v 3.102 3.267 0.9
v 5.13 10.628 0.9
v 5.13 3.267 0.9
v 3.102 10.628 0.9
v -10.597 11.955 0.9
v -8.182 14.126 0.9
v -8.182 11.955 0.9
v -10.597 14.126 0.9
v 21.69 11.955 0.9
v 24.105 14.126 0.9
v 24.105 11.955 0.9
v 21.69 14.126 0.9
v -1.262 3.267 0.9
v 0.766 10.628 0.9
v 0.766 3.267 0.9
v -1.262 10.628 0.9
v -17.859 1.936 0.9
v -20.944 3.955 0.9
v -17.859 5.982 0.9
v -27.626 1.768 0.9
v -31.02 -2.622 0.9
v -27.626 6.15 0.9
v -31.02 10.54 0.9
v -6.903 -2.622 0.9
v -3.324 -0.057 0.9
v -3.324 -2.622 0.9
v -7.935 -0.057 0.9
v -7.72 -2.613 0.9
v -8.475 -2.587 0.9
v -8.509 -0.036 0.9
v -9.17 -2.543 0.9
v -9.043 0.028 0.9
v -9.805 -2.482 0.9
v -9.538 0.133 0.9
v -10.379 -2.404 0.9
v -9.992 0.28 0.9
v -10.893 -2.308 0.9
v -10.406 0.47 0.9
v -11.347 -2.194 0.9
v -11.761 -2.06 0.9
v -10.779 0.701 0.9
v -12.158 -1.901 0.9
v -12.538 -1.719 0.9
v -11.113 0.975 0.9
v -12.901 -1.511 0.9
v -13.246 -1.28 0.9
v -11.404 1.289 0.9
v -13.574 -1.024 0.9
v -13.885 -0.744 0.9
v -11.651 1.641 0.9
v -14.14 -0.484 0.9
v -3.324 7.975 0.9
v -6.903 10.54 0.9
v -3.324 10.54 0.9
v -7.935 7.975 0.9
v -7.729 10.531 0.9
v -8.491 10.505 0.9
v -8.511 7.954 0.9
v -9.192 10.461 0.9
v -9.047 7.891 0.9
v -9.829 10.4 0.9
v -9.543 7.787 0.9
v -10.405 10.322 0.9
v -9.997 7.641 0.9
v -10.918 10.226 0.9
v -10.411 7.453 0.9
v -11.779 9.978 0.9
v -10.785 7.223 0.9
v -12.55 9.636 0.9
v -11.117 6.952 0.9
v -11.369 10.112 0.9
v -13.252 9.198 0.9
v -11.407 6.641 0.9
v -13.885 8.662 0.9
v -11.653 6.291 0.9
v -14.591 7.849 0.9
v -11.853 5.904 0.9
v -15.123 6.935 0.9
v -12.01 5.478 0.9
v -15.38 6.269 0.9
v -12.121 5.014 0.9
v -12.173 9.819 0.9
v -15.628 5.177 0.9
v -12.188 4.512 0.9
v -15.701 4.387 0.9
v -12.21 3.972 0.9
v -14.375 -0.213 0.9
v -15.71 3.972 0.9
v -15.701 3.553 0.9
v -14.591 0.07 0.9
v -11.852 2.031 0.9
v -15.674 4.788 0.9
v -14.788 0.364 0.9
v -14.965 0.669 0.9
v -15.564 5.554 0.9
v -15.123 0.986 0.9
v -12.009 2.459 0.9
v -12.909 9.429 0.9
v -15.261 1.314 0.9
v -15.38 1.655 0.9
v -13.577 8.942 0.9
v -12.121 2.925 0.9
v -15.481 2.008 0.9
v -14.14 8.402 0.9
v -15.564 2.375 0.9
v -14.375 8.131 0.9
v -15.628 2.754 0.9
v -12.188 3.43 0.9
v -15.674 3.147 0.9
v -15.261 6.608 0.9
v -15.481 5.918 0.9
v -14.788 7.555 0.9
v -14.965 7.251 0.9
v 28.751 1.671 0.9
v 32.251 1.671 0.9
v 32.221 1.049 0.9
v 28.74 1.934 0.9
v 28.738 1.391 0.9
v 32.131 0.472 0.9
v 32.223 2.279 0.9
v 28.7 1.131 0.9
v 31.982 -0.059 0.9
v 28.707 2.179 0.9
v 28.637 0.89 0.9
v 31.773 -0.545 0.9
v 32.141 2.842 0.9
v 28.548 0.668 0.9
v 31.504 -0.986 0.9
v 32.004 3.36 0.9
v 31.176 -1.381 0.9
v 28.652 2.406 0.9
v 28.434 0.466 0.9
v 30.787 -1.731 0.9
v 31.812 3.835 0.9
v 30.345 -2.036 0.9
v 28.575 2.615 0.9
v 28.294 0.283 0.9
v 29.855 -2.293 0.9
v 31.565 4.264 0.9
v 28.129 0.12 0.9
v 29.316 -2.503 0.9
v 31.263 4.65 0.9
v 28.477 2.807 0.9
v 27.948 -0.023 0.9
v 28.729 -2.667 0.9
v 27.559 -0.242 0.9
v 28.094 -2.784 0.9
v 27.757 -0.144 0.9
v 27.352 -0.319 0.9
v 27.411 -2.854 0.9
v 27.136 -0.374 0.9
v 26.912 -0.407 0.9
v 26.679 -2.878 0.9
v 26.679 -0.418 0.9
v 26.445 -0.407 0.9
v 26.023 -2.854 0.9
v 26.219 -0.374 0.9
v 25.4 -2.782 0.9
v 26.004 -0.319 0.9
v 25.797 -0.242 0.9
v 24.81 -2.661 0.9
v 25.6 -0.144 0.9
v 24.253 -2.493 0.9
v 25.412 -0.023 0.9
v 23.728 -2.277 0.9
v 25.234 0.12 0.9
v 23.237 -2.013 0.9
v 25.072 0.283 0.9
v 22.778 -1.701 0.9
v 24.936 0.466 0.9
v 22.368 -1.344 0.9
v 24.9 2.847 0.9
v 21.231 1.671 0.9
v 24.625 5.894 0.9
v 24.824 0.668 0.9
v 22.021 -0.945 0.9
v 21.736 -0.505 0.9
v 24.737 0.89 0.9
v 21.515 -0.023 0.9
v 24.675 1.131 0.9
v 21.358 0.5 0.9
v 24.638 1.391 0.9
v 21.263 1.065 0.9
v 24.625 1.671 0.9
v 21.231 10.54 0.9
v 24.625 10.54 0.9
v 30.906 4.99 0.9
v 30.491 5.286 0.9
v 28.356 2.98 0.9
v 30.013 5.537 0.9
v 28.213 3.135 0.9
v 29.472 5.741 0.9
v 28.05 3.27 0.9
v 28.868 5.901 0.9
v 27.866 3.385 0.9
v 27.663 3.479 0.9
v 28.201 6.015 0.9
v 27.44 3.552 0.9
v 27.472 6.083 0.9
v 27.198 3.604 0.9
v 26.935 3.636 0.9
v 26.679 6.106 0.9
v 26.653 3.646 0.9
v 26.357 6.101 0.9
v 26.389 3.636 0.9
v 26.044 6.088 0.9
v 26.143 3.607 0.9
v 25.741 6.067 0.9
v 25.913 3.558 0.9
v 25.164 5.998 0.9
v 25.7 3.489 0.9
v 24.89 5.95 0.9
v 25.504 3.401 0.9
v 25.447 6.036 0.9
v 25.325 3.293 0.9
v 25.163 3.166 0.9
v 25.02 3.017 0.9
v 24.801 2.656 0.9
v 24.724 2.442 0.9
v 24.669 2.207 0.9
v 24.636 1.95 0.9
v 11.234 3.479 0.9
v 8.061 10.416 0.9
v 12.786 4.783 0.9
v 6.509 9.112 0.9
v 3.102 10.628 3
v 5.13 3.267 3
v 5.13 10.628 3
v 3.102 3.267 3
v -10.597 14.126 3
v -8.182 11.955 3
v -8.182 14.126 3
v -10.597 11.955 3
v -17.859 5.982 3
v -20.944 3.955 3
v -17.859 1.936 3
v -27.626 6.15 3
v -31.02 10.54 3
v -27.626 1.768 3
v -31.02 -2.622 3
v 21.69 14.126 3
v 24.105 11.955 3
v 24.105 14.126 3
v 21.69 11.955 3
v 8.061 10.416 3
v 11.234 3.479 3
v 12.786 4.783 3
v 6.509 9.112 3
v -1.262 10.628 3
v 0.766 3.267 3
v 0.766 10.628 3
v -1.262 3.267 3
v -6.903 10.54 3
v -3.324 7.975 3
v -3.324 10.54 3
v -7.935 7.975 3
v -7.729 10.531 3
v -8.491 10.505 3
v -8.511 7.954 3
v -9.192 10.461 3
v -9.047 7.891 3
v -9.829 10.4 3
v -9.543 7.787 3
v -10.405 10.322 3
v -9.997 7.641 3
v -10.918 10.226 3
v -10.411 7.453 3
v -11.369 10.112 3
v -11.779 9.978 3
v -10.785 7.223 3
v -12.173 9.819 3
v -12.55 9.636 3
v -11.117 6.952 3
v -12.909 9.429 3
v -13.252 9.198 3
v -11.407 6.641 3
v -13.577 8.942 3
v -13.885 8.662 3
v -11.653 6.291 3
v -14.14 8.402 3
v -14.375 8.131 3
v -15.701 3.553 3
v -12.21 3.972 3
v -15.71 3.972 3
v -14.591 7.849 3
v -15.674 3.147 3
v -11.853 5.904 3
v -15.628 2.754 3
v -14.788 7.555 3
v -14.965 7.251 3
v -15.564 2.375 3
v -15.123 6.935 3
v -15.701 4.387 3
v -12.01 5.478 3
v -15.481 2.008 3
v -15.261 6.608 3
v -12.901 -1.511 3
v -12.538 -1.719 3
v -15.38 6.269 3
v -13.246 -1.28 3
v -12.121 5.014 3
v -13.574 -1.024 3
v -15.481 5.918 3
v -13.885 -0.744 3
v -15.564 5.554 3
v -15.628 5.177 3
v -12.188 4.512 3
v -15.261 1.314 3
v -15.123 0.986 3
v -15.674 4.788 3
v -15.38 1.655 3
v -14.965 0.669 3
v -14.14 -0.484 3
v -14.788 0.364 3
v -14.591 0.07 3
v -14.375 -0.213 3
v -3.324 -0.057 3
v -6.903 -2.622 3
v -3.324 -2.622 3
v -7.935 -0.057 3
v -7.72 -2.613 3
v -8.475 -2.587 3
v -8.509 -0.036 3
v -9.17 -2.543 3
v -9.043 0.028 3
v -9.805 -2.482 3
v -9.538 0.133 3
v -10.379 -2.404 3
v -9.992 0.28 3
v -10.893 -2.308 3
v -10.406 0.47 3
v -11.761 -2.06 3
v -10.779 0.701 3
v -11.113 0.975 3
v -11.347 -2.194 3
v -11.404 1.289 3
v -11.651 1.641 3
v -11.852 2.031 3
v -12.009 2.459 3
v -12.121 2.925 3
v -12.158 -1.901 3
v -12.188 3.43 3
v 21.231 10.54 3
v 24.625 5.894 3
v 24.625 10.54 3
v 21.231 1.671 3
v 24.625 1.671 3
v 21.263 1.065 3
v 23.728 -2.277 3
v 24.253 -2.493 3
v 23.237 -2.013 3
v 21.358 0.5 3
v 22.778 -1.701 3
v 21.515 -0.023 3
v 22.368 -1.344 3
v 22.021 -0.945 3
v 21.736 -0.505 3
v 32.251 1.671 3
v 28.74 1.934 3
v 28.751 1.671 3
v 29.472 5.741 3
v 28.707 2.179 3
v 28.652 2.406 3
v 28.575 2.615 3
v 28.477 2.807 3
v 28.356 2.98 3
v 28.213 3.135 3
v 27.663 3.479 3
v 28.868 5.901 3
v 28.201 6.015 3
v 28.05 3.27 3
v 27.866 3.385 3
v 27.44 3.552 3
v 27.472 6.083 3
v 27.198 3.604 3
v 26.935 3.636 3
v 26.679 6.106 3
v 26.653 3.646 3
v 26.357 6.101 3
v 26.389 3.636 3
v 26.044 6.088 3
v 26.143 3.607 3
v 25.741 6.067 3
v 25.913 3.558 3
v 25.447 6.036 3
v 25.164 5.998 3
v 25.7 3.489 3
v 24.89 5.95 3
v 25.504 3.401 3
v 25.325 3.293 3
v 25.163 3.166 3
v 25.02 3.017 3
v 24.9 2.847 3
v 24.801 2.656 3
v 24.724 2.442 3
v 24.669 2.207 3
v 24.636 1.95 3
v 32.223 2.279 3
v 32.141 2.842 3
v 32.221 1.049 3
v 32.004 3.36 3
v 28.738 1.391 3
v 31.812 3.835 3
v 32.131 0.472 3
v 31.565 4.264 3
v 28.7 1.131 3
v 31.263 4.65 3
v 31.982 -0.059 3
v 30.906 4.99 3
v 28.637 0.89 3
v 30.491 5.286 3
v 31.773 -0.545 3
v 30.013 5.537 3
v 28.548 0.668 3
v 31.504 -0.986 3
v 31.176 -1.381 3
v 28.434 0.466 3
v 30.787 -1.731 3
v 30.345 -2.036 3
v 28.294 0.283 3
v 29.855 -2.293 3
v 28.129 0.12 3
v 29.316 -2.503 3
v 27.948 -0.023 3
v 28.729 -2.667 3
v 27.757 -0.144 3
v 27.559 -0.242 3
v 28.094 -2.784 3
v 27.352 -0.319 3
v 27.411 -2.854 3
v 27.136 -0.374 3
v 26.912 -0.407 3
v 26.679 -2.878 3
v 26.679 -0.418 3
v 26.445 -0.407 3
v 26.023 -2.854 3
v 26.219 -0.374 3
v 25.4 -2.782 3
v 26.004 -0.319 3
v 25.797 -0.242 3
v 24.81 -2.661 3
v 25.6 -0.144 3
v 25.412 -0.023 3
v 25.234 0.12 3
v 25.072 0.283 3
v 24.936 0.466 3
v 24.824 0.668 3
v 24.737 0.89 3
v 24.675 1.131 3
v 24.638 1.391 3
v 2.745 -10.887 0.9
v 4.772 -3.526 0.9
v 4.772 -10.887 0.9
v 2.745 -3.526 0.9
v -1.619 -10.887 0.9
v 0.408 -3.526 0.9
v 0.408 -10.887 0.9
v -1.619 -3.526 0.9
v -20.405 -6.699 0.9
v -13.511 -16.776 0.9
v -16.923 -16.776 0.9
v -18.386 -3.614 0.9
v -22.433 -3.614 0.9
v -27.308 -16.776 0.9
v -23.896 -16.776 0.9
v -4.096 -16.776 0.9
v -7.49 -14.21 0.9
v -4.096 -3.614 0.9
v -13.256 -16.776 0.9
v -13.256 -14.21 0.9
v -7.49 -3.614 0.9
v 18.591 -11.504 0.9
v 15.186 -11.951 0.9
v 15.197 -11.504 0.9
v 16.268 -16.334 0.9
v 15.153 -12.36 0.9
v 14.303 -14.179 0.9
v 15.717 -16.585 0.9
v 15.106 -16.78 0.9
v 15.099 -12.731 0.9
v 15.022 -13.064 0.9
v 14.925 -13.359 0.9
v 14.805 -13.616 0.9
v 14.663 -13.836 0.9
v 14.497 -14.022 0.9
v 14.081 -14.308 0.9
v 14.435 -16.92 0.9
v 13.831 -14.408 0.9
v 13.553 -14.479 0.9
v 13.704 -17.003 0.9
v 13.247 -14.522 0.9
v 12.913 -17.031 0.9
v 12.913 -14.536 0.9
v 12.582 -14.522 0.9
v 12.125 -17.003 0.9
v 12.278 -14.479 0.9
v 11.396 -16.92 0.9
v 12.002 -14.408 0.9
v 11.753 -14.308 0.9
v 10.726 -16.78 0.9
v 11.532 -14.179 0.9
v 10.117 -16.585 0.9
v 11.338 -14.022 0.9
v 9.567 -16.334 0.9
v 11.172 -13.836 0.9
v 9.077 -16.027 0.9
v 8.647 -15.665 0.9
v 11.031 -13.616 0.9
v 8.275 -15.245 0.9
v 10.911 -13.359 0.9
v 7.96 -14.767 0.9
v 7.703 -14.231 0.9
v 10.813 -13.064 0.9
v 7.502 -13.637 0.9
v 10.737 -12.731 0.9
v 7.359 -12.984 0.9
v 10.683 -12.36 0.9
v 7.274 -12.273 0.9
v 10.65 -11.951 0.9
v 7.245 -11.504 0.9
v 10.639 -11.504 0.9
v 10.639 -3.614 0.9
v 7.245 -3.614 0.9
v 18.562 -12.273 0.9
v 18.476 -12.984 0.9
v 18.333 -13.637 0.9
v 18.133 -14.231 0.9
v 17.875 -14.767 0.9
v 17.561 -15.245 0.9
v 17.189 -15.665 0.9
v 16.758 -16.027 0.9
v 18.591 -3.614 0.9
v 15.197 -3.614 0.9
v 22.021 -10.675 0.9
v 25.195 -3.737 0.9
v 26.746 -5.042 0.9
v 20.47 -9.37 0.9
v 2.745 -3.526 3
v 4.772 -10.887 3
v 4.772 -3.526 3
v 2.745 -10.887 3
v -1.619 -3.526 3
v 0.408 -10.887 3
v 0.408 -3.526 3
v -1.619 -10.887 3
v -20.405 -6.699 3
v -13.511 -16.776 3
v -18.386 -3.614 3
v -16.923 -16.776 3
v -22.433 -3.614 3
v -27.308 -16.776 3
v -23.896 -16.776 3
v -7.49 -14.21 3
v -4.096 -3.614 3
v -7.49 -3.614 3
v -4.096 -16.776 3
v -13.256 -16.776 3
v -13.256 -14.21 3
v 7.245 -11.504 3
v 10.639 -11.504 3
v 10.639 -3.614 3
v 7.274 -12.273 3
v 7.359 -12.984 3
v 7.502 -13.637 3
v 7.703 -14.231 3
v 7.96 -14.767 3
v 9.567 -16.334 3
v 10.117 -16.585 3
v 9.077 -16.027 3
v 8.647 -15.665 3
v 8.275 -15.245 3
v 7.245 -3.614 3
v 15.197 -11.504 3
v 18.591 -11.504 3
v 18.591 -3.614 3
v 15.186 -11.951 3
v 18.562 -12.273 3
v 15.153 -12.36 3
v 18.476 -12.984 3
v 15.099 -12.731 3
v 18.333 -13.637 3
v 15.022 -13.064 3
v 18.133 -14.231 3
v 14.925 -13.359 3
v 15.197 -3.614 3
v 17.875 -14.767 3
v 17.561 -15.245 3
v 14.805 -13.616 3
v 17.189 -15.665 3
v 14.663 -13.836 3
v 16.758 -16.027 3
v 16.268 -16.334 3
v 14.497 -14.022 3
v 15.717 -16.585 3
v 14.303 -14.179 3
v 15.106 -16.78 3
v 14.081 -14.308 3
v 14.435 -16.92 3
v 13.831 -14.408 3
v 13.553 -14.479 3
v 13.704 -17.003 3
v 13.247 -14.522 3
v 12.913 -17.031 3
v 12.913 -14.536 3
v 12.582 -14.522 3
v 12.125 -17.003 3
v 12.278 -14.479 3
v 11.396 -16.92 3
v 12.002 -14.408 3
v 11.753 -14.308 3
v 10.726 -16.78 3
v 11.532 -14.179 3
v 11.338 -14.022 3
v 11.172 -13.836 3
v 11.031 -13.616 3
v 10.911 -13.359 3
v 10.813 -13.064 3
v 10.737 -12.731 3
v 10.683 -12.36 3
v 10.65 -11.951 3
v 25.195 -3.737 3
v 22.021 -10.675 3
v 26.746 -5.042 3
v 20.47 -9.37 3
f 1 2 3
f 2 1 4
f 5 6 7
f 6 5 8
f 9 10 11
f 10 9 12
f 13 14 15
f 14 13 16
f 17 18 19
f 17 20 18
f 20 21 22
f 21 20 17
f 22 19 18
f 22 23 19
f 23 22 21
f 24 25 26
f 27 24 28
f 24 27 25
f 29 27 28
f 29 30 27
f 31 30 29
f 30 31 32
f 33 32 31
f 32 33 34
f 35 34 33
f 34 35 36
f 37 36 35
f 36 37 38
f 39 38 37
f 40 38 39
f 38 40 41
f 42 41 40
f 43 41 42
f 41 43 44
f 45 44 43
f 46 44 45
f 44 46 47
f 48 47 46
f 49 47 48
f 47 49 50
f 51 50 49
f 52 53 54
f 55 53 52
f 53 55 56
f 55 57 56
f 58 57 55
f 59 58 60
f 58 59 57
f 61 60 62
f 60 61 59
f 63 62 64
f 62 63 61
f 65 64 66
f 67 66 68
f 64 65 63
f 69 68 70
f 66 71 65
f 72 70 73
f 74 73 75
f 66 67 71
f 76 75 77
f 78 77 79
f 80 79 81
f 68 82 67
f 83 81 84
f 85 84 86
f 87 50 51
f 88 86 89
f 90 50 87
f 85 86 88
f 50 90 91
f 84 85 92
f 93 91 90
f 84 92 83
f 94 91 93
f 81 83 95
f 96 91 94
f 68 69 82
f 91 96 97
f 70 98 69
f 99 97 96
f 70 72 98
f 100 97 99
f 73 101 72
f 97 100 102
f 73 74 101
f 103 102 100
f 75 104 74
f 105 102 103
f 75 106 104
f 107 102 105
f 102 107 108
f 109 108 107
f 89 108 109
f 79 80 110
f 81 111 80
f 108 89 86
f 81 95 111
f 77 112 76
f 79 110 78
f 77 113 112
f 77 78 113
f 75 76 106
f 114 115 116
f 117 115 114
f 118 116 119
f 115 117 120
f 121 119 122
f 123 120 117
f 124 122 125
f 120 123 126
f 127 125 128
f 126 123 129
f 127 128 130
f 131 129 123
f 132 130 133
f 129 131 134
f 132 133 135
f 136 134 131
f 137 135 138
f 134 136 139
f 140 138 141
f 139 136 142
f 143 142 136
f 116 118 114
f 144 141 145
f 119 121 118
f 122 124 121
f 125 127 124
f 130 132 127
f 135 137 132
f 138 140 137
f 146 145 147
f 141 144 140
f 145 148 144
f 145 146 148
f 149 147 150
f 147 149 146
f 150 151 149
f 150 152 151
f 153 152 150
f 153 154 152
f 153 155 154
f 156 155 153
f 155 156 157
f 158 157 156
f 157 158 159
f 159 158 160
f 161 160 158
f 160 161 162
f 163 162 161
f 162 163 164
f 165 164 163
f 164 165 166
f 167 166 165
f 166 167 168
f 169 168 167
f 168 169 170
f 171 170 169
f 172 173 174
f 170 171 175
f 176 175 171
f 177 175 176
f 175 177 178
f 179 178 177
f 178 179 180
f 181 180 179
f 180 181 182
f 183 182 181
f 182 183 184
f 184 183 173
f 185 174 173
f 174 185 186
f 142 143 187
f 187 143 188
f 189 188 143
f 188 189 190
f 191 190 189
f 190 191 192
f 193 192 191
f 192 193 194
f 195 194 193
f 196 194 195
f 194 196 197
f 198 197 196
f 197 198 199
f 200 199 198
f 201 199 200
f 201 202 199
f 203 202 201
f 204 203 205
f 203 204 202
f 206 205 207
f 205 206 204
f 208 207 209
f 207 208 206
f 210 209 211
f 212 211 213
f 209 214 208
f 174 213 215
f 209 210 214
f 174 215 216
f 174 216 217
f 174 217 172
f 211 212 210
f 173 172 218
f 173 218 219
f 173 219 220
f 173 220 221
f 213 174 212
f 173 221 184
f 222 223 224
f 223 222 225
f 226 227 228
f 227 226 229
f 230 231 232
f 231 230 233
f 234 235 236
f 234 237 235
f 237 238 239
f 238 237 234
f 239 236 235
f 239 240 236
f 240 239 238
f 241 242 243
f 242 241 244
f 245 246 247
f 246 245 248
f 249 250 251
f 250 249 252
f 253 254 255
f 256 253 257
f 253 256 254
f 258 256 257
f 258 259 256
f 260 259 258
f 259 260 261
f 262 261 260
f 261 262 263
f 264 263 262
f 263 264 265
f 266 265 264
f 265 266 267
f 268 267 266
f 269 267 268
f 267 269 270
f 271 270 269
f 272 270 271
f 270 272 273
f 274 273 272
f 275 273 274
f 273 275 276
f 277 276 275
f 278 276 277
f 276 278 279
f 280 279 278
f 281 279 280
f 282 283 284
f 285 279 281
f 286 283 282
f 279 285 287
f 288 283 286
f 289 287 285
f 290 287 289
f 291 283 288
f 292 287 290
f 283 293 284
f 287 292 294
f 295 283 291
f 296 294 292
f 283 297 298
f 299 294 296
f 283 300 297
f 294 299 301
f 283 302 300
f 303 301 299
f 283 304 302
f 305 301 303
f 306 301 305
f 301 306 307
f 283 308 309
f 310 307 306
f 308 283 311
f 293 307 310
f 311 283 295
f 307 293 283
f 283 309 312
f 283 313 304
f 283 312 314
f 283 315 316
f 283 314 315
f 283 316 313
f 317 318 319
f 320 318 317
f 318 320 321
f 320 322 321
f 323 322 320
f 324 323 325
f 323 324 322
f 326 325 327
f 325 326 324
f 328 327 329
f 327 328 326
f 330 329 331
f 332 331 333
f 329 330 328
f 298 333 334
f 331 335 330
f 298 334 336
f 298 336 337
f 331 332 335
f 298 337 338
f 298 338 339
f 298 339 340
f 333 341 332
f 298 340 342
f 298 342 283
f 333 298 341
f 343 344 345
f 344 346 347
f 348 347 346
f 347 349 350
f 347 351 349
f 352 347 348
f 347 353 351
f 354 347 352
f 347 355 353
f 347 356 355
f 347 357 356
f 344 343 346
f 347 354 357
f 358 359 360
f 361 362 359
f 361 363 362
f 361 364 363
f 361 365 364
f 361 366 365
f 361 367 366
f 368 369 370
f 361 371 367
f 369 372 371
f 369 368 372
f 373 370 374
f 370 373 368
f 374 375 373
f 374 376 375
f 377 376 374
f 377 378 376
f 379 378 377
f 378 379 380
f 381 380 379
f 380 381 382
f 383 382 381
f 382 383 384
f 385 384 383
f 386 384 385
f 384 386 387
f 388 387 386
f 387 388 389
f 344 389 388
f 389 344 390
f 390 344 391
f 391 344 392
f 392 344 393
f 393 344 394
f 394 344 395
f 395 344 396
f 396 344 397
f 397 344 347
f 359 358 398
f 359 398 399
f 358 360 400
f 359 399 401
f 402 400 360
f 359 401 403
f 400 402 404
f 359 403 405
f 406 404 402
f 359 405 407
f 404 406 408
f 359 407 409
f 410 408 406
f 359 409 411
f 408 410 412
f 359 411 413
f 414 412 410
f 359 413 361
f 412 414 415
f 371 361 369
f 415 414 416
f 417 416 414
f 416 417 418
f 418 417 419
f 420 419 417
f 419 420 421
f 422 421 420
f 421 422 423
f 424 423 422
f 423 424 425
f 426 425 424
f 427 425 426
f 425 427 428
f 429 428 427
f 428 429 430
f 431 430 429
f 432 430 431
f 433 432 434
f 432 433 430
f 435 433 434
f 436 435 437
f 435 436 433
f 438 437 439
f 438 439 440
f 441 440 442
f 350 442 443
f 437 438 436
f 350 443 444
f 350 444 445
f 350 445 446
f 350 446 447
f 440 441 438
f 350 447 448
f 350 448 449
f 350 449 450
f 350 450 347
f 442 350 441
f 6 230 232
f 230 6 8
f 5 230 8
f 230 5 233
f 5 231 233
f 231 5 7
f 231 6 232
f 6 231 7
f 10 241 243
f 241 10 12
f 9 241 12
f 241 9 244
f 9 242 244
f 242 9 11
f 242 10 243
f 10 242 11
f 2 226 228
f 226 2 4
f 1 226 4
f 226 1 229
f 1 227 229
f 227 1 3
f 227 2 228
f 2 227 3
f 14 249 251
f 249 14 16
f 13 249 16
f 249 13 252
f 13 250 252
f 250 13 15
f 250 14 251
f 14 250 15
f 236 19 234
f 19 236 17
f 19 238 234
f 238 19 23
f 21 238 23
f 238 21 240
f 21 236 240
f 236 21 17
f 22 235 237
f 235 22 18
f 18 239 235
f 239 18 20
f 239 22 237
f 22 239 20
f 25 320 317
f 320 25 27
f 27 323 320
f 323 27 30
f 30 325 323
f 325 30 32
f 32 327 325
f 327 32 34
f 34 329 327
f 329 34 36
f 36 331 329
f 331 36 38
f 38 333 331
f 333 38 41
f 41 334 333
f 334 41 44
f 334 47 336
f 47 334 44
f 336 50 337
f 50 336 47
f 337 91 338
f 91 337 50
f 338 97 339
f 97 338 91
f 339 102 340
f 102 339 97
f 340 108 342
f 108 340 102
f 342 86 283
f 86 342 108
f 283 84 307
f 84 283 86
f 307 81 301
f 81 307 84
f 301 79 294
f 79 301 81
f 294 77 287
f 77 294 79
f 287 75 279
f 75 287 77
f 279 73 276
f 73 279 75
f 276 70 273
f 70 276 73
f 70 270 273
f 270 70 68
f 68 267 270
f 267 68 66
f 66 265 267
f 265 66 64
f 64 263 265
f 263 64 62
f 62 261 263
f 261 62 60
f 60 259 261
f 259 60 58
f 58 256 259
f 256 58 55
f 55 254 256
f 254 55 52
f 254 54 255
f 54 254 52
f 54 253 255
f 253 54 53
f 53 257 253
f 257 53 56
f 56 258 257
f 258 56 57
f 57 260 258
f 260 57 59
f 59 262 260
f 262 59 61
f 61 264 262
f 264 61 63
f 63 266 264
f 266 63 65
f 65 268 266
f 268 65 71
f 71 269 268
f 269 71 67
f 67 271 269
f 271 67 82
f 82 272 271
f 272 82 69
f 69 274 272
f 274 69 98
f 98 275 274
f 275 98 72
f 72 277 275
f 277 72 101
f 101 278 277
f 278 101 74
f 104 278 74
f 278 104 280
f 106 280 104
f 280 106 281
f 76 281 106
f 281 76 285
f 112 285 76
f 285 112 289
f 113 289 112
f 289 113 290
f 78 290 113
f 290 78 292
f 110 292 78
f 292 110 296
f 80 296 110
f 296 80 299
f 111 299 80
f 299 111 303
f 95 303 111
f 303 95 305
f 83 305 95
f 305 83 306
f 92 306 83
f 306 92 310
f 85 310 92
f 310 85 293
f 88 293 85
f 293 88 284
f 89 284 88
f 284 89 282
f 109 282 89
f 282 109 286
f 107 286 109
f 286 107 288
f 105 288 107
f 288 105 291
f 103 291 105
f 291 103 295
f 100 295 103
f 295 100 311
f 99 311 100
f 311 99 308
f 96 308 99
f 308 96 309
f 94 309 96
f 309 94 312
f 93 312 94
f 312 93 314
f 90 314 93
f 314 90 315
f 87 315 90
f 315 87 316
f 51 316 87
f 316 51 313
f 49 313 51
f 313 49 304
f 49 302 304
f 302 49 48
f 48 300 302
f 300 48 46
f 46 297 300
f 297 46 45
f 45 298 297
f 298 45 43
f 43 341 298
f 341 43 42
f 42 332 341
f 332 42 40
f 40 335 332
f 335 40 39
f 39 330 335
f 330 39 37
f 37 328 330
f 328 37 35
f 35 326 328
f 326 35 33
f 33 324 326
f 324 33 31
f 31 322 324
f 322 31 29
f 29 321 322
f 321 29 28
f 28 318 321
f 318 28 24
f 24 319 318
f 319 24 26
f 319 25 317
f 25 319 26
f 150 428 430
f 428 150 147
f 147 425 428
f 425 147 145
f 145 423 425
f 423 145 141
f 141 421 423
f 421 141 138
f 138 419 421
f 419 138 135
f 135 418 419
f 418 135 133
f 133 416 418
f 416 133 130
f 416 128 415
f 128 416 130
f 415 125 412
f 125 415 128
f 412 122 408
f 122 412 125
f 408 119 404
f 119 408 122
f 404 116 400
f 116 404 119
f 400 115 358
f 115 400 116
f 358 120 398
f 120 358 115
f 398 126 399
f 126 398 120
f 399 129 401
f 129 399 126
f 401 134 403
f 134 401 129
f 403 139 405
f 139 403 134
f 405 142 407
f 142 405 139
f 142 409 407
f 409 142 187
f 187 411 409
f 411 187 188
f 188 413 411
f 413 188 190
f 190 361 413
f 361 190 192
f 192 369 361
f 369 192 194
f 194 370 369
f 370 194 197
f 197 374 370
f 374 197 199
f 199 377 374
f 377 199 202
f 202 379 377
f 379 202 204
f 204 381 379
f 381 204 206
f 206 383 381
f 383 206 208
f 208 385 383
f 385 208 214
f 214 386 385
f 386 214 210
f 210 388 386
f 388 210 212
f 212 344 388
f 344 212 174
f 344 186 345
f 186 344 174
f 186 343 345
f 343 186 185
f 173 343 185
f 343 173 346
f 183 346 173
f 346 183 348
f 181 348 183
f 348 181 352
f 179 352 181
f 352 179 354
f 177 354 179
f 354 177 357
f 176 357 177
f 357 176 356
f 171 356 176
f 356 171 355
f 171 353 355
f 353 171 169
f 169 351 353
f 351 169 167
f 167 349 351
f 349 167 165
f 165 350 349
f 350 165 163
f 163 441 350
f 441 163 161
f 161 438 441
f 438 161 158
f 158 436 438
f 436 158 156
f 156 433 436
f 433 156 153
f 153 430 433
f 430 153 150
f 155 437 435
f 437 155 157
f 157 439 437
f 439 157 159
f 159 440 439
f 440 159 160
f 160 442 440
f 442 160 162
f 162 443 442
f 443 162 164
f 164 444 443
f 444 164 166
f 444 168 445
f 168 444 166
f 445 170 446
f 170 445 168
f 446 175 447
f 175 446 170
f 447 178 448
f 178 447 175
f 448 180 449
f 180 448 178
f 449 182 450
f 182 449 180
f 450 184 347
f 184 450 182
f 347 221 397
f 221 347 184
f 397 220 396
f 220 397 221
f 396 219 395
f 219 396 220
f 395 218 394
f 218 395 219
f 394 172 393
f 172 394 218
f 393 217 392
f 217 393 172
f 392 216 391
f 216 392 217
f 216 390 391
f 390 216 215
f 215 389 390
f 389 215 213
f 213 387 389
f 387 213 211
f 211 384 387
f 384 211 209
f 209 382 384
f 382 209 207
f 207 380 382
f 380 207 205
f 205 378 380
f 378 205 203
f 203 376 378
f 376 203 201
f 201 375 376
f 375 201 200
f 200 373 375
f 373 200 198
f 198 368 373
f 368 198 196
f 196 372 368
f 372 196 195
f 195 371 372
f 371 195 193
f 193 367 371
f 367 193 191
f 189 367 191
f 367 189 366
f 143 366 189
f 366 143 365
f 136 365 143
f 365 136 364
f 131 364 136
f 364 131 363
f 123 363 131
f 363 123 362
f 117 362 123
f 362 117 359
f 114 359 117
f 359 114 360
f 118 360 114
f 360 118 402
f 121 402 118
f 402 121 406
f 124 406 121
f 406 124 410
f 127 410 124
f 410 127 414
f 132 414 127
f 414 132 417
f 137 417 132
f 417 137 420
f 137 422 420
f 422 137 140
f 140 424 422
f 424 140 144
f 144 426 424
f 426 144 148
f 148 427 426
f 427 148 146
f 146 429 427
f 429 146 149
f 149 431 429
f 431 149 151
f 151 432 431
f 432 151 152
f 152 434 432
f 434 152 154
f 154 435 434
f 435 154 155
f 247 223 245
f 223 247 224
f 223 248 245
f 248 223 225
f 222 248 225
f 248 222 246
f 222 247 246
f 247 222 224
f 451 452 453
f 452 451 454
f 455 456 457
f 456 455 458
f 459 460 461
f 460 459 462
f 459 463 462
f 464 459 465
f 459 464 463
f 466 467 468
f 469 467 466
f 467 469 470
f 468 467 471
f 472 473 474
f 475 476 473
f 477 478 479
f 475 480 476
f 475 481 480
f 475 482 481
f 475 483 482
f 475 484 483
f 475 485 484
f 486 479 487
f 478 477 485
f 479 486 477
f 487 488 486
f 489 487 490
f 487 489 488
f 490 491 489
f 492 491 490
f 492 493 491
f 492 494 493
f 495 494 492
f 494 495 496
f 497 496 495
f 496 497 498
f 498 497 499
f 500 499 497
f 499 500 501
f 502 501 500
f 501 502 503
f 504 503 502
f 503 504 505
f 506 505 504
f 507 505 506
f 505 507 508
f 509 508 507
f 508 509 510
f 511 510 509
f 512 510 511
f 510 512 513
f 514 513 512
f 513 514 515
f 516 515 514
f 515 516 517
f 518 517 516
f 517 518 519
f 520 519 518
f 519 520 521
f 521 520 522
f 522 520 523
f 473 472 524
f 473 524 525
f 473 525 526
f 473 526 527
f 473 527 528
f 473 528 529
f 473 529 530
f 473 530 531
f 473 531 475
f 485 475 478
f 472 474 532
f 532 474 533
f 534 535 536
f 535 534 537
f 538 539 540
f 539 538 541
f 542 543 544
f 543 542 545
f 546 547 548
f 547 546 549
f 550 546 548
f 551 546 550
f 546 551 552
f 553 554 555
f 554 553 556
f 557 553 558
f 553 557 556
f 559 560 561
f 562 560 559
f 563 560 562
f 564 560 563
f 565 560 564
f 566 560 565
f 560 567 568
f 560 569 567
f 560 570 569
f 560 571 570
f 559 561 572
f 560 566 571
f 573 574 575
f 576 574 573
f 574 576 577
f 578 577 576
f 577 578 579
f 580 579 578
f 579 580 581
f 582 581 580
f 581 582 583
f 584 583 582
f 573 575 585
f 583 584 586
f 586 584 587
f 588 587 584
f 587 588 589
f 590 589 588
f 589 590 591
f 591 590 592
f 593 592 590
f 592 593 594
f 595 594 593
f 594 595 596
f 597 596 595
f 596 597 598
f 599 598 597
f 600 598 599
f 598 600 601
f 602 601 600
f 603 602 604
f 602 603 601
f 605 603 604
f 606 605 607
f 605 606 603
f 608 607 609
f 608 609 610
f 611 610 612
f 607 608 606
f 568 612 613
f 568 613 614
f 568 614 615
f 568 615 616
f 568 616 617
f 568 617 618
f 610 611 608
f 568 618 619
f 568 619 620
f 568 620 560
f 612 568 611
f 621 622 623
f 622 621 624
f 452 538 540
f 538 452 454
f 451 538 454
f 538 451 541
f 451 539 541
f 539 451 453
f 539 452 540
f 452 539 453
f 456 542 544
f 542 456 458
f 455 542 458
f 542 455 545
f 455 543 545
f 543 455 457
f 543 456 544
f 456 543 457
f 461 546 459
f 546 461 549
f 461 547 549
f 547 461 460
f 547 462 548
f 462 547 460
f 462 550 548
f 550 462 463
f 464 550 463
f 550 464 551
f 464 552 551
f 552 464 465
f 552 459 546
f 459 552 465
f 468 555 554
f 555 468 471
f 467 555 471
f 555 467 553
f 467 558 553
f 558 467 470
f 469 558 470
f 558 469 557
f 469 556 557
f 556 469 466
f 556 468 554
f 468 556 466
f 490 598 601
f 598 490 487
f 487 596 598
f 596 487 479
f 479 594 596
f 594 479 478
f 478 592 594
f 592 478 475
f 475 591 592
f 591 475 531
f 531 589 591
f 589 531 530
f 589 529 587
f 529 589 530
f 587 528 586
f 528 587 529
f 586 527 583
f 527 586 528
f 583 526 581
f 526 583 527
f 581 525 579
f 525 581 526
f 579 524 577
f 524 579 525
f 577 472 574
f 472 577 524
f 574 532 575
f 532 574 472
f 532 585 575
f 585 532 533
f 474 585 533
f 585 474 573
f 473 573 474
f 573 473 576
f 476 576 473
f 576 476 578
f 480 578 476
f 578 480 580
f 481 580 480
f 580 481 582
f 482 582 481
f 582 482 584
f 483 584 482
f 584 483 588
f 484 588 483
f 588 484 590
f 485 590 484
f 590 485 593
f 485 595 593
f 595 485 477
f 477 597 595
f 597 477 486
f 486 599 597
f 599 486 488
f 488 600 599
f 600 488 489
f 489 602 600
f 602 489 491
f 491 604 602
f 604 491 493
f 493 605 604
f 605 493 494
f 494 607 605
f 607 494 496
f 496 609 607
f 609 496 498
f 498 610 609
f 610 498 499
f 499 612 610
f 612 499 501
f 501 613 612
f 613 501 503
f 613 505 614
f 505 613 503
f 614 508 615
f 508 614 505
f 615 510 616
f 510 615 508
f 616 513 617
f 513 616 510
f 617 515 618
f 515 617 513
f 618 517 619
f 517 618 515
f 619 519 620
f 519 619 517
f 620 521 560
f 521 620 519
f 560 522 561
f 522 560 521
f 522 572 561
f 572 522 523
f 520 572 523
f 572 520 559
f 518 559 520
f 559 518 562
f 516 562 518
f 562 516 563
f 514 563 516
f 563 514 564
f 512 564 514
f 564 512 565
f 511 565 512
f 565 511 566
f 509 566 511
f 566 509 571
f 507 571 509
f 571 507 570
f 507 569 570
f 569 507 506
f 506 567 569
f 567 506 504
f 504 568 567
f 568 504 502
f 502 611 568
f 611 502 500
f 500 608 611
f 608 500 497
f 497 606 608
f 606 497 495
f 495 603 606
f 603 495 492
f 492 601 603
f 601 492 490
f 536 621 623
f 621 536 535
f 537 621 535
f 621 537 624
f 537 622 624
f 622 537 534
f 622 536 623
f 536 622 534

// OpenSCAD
$fn = 48;
  // syllabics (overlaid on icon, tallest)
  translate([0, 5.430, 0.900]) linear_extrude(height=2.100) text("ᐅᑖᐦᐠ ᑳ", size=13.000, halign="center", valign="center", font="Euphemia UCAS:style=Bold");
  translate([0, -10.430, 0.900]) linear_extrude(height=2.100) text("ᐱᒧᐦᑌᐟ", size=13.000, halign="center", valign="center", font="Euphemia UCAS:style=Bold");
